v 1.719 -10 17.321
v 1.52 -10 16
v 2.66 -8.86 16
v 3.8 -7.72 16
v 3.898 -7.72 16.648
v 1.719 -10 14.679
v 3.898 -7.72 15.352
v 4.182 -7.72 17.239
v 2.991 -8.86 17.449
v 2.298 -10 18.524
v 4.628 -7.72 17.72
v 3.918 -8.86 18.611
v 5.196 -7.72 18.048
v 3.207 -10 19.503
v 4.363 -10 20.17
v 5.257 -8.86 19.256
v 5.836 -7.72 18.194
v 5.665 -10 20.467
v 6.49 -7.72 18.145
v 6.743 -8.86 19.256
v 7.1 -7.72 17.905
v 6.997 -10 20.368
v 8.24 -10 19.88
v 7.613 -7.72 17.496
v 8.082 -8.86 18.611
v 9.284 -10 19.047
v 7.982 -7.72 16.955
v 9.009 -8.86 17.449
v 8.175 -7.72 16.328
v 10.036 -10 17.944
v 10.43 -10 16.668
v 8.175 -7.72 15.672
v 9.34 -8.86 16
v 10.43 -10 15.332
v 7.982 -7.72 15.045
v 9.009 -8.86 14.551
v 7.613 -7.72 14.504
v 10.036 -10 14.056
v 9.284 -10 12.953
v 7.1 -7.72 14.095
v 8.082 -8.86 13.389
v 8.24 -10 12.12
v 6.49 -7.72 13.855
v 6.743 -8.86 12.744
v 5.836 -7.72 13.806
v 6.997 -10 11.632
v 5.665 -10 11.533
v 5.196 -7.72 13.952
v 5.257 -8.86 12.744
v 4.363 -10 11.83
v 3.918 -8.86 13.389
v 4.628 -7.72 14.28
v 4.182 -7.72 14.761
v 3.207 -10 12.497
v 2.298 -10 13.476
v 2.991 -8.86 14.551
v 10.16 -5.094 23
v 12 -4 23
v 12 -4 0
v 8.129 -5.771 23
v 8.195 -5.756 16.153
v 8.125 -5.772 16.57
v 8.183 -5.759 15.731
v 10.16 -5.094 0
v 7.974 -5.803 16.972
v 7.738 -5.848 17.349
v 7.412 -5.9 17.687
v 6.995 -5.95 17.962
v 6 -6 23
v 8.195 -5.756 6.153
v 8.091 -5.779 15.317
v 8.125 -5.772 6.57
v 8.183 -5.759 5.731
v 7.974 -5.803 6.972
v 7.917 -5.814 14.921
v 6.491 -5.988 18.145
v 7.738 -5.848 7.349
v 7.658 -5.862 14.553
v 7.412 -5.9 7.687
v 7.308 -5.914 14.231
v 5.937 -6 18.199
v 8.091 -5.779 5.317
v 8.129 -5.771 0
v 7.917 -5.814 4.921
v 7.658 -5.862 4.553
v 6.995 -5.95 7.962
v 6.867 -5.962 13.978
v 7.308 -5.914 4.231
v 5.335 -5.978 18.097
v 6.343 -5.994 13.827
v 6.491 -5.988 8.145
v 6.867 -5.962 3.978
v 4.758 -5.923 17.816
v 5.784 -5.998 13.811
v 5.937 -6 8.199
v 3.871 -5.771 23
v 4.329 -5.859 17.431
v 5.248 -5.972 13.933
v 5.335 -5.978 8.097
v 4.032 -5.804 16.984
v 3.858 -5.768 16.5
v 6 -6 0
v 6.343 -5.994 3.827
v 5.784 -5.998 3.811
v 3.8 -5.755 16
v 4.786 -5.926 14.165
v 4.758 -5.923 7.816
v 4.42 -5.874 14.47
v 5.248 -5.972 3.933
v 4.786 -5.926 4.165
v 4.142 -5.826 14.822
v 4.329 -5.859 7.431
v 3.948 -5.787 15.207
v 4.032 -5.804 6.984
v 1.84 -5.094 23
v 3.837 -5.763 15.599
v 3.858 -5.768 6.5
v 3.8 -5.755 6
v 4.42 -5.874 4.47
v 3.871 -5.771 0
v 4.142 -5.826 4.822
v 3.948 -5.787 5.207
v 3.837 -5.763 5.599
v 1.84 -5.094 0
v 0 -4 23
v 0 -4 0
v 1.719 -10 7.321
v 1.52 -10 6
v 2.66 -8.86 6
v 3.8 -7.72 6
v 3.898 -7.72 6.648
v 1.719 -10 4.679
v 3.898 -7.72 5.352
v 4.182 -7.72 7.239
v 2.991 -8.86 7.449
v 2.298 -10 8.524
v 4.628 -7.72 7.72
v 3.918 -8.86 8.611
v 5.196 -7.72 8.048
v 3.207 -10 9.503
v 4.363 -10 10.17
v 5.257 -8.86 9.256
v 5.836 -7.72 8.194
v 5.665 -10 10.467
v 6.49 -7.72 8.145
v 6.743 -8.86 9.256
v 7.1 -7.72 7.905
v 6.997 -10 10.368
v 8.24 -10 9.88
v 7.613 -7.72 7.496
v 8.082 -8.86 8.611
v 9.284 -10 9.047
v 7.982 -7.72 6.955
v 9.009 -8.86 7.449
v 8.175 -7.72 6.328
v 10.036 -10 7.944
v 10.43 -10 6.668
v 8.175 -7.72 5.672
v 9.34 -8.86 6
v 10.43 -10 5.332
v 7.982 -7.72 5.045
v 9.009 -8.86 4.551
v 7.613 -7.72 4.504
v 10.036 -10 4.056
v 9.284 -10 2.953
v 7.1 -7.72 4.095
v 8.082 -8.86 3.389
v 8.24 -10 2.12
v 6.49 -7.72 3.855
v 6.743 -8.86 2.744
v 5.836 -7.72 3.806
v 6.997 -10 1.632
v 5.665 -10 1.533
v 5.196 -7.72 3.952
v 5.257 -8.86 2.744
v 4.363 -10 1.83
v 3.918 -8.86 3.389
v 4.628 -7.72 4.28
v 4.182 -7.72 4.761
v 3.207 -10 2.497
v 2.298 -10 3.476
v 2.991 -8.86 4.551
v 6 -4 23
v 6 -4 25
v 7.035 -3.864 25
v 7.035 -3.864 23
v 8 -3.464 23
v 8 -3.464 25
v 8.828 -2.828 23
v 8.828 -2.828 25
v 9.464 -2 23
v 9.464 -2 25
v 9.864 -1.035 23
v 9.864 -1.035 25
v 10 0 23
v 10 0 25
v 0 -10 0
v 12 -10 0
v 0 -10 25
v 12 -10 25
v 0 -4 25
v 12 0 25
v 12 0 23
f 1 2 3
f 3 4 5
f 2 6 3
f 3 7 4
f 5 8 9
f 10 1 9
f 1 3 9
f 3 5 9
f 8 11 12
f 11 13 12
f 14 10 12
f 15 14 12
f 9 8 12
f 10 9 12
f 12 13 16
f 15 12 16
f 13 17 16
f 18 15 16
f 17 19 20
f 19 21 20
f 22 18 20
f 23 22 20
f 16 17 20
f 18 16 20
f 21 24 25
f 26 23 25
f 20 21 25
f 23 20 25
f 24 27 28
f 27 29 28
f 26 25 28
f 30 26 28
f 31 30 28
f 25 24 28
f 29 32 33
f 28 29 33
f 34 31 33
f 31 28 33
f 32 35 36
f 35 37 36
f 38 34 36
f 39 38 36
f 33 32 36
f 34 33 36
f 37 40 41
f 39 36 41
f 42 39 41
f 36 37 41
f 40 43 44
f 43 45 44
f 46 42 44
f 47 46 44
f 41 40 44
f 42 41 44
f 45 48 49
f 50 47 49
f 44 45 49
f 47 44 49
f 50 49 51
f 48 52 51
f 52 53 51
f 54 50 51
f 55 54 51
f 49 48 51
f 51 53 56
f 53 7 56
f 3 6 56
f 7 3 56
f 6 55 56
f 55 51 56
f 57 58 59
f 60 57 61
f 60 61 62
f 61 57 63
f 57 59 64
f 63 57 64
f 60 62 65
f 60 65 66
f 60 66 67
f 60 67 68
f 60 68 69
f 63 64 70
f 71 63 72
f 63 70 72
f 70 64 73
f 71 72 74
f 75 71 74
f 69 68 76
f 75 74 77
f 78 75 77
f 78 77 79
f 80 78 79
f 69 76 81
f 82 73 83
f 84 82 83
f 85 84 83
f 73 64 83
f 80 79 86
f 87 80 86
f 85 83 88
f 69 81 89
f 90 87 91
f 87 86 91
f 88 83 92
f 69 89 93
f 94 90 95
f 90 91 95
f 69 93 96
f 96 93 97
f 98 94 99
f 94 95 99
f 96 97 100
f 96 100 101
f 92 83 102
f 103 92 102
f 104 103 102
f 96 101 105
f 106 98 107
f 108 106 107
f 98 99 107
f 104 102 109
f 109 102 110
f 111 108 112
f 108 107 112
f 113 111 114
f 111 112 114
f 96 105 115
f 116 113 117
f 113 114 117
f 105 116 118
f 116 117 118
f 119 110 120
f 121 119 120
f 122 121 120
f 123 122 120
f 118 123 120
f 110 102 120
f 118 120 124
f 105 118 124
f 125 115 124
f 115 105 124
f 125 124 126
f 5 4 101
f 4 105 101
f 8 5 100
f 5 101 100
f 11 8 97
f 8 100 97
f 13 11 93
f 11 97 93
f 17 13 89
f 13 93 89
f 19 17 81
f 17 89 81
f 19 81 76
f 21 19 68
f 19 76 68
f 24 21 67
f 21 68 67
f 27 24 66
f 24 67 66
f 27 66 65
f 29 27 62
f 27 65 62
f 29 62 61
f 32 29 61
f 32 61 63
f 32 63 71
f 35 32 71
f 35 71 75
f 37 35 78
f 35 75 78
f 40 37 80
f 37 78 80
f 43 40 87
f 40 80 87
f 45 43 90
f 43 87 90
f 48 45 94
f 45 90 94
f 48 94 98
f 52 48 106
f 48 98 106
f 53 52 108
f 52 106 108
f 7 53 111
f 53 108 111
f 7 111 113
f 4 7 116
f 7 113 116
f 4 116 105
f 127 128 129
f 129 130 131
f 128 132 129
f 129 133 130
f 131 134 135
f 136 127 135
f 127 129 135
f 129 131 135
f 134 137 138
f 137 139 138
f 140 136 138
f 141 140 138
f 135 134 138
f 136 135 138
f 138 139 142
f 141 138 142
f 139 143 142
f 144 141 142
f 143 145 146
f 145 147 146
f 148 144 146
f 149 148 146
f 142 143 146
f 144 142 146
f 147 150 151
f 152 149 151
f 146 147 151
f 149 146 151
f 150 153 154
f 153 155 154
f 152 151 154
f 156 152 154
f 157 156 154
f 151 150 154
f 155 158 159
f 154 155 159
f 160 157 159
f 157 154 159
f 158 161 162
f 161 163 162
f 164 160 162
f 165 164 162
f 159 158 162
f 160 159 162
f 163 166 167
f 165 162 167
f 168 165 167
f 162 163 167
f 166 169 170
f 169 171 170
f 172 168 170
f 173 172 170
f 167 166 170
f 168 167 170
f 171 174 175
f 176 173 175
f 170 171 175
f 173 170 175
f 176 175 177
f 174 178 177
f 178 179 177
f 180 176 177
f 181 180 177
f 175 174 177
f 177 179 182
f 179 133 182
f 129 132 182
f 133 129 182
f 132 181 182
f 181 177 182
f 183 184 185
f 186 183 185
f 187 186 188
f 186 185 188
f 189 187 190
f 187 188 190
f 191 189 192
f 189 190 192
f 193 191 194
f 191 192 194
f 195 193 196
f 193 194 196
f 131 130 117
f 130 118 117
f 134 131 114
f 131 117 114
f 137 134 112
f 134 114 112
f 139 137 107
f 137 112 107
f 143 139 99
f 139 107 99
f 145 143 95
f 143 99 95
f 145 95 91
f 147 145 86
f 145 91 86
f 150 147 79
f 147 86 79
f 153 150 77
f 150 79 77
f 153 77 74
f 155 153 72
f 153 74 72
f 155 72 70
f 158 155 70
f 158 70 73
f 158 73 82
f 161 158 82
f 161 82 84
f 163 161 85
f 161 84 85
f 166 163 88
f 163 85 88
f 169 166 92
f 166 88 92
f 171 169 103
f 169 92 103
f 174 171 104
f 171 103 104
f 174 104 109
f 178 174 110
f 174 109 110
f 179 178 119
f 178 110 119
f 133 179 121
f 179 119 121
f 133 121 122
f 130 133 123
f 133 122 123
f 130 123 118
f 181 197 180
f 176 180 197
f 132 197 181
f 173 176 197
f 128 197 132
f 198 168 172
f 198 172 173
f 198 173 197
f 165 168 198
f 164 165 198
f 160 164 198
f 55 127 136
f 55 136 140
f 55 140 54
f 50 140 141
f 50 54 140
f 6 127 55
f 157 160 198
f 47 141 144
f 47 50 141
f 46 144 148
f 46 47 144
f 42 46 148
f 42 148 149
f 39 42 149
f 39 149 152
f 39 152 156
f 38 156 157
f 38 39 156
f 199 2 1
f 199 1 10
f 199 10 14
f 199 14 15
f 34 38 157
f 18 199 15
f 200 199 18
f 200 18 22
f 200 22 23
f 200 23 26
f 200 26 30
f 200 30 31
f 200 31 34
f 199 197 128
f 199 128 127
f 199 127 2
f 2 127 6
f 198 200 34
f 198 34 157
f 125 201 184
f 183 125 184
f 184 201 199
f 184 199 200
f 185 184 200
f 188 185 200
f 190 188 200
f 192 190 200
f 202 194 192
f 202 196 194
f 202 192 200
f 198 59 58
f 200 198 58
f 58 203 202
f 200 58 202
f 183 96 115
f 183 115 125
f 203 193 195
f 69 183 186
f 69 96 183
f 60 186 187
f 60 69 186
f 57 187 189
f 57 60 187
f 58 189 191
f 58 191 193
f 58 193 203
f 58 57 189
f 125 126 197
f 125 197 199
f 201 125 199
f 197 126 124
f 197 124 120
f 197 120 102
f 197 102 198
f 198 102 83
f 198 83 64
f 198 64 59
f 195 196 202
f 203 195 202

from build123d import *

# Parameters (mm, degrees)
F0_W           = 12
F0_H           = 25
F1_DEPTH       = 10
F2_R           = 10
F3_DEPTH       = 23
F5_DEPTH       = 25
F7_D           = 4.4
F7_CSINK_D     = 8.96
F7_CSINK_ANGLE = 90


with BuildPart() as f1:
    # F0 (on Front) → F1 (new body)
    with BuildSketch(Plane.XZ):
        with Locations((6, 12.5)):
            Rectangle(F0_W, F0_H)
    extrude(amount=F1_DEPTH)

    # F2 (on face) → F3 (cut)
    with BuildSketch(Plane(origin=(0, 0, 0), x_dir=(1, 0, 0), z_dir=(0, 0, -1))):
        with Locations((6, -4)):
            Circle(F2_R)
    extrude(amount=-F3_DEPTH, mode=Mode.SUBTRACT)

    # F4 (on face) → F5 (cut)
    with BuildSketch(Plane.XY.offset(25)):
        with BuildLine():
            ThreePointArc((6, -4), (8.8284271247, -2.8284271247), (10, 0))
            ThreePointArc((10, 0), (3.1715728753, 2.8284271247), (6, -4))
        make_face()
        with BuildLine():
            Line((0, -4), (6, -4))
            ThreePointArc((6, -4), (3.1715728753, -2.8284271247), (2, 0))
            Line((2, 0), (0, 0))
            Line((0, 0), (0, -4))
        make_face()
    extrude(amount=-F5_DEPTH, mode=Mode.SUBTRACT)

    # F7 (through all)
    with Locations(Plane.XZ.offset(10)):
        with Locations((6, 6), (6, 16)):
            CounterSinkHole(F7_D / 2, F7_CSINK_D / 2, counter_sink_angle=F7_CSINK_ANGLE)


solid = f1.part
